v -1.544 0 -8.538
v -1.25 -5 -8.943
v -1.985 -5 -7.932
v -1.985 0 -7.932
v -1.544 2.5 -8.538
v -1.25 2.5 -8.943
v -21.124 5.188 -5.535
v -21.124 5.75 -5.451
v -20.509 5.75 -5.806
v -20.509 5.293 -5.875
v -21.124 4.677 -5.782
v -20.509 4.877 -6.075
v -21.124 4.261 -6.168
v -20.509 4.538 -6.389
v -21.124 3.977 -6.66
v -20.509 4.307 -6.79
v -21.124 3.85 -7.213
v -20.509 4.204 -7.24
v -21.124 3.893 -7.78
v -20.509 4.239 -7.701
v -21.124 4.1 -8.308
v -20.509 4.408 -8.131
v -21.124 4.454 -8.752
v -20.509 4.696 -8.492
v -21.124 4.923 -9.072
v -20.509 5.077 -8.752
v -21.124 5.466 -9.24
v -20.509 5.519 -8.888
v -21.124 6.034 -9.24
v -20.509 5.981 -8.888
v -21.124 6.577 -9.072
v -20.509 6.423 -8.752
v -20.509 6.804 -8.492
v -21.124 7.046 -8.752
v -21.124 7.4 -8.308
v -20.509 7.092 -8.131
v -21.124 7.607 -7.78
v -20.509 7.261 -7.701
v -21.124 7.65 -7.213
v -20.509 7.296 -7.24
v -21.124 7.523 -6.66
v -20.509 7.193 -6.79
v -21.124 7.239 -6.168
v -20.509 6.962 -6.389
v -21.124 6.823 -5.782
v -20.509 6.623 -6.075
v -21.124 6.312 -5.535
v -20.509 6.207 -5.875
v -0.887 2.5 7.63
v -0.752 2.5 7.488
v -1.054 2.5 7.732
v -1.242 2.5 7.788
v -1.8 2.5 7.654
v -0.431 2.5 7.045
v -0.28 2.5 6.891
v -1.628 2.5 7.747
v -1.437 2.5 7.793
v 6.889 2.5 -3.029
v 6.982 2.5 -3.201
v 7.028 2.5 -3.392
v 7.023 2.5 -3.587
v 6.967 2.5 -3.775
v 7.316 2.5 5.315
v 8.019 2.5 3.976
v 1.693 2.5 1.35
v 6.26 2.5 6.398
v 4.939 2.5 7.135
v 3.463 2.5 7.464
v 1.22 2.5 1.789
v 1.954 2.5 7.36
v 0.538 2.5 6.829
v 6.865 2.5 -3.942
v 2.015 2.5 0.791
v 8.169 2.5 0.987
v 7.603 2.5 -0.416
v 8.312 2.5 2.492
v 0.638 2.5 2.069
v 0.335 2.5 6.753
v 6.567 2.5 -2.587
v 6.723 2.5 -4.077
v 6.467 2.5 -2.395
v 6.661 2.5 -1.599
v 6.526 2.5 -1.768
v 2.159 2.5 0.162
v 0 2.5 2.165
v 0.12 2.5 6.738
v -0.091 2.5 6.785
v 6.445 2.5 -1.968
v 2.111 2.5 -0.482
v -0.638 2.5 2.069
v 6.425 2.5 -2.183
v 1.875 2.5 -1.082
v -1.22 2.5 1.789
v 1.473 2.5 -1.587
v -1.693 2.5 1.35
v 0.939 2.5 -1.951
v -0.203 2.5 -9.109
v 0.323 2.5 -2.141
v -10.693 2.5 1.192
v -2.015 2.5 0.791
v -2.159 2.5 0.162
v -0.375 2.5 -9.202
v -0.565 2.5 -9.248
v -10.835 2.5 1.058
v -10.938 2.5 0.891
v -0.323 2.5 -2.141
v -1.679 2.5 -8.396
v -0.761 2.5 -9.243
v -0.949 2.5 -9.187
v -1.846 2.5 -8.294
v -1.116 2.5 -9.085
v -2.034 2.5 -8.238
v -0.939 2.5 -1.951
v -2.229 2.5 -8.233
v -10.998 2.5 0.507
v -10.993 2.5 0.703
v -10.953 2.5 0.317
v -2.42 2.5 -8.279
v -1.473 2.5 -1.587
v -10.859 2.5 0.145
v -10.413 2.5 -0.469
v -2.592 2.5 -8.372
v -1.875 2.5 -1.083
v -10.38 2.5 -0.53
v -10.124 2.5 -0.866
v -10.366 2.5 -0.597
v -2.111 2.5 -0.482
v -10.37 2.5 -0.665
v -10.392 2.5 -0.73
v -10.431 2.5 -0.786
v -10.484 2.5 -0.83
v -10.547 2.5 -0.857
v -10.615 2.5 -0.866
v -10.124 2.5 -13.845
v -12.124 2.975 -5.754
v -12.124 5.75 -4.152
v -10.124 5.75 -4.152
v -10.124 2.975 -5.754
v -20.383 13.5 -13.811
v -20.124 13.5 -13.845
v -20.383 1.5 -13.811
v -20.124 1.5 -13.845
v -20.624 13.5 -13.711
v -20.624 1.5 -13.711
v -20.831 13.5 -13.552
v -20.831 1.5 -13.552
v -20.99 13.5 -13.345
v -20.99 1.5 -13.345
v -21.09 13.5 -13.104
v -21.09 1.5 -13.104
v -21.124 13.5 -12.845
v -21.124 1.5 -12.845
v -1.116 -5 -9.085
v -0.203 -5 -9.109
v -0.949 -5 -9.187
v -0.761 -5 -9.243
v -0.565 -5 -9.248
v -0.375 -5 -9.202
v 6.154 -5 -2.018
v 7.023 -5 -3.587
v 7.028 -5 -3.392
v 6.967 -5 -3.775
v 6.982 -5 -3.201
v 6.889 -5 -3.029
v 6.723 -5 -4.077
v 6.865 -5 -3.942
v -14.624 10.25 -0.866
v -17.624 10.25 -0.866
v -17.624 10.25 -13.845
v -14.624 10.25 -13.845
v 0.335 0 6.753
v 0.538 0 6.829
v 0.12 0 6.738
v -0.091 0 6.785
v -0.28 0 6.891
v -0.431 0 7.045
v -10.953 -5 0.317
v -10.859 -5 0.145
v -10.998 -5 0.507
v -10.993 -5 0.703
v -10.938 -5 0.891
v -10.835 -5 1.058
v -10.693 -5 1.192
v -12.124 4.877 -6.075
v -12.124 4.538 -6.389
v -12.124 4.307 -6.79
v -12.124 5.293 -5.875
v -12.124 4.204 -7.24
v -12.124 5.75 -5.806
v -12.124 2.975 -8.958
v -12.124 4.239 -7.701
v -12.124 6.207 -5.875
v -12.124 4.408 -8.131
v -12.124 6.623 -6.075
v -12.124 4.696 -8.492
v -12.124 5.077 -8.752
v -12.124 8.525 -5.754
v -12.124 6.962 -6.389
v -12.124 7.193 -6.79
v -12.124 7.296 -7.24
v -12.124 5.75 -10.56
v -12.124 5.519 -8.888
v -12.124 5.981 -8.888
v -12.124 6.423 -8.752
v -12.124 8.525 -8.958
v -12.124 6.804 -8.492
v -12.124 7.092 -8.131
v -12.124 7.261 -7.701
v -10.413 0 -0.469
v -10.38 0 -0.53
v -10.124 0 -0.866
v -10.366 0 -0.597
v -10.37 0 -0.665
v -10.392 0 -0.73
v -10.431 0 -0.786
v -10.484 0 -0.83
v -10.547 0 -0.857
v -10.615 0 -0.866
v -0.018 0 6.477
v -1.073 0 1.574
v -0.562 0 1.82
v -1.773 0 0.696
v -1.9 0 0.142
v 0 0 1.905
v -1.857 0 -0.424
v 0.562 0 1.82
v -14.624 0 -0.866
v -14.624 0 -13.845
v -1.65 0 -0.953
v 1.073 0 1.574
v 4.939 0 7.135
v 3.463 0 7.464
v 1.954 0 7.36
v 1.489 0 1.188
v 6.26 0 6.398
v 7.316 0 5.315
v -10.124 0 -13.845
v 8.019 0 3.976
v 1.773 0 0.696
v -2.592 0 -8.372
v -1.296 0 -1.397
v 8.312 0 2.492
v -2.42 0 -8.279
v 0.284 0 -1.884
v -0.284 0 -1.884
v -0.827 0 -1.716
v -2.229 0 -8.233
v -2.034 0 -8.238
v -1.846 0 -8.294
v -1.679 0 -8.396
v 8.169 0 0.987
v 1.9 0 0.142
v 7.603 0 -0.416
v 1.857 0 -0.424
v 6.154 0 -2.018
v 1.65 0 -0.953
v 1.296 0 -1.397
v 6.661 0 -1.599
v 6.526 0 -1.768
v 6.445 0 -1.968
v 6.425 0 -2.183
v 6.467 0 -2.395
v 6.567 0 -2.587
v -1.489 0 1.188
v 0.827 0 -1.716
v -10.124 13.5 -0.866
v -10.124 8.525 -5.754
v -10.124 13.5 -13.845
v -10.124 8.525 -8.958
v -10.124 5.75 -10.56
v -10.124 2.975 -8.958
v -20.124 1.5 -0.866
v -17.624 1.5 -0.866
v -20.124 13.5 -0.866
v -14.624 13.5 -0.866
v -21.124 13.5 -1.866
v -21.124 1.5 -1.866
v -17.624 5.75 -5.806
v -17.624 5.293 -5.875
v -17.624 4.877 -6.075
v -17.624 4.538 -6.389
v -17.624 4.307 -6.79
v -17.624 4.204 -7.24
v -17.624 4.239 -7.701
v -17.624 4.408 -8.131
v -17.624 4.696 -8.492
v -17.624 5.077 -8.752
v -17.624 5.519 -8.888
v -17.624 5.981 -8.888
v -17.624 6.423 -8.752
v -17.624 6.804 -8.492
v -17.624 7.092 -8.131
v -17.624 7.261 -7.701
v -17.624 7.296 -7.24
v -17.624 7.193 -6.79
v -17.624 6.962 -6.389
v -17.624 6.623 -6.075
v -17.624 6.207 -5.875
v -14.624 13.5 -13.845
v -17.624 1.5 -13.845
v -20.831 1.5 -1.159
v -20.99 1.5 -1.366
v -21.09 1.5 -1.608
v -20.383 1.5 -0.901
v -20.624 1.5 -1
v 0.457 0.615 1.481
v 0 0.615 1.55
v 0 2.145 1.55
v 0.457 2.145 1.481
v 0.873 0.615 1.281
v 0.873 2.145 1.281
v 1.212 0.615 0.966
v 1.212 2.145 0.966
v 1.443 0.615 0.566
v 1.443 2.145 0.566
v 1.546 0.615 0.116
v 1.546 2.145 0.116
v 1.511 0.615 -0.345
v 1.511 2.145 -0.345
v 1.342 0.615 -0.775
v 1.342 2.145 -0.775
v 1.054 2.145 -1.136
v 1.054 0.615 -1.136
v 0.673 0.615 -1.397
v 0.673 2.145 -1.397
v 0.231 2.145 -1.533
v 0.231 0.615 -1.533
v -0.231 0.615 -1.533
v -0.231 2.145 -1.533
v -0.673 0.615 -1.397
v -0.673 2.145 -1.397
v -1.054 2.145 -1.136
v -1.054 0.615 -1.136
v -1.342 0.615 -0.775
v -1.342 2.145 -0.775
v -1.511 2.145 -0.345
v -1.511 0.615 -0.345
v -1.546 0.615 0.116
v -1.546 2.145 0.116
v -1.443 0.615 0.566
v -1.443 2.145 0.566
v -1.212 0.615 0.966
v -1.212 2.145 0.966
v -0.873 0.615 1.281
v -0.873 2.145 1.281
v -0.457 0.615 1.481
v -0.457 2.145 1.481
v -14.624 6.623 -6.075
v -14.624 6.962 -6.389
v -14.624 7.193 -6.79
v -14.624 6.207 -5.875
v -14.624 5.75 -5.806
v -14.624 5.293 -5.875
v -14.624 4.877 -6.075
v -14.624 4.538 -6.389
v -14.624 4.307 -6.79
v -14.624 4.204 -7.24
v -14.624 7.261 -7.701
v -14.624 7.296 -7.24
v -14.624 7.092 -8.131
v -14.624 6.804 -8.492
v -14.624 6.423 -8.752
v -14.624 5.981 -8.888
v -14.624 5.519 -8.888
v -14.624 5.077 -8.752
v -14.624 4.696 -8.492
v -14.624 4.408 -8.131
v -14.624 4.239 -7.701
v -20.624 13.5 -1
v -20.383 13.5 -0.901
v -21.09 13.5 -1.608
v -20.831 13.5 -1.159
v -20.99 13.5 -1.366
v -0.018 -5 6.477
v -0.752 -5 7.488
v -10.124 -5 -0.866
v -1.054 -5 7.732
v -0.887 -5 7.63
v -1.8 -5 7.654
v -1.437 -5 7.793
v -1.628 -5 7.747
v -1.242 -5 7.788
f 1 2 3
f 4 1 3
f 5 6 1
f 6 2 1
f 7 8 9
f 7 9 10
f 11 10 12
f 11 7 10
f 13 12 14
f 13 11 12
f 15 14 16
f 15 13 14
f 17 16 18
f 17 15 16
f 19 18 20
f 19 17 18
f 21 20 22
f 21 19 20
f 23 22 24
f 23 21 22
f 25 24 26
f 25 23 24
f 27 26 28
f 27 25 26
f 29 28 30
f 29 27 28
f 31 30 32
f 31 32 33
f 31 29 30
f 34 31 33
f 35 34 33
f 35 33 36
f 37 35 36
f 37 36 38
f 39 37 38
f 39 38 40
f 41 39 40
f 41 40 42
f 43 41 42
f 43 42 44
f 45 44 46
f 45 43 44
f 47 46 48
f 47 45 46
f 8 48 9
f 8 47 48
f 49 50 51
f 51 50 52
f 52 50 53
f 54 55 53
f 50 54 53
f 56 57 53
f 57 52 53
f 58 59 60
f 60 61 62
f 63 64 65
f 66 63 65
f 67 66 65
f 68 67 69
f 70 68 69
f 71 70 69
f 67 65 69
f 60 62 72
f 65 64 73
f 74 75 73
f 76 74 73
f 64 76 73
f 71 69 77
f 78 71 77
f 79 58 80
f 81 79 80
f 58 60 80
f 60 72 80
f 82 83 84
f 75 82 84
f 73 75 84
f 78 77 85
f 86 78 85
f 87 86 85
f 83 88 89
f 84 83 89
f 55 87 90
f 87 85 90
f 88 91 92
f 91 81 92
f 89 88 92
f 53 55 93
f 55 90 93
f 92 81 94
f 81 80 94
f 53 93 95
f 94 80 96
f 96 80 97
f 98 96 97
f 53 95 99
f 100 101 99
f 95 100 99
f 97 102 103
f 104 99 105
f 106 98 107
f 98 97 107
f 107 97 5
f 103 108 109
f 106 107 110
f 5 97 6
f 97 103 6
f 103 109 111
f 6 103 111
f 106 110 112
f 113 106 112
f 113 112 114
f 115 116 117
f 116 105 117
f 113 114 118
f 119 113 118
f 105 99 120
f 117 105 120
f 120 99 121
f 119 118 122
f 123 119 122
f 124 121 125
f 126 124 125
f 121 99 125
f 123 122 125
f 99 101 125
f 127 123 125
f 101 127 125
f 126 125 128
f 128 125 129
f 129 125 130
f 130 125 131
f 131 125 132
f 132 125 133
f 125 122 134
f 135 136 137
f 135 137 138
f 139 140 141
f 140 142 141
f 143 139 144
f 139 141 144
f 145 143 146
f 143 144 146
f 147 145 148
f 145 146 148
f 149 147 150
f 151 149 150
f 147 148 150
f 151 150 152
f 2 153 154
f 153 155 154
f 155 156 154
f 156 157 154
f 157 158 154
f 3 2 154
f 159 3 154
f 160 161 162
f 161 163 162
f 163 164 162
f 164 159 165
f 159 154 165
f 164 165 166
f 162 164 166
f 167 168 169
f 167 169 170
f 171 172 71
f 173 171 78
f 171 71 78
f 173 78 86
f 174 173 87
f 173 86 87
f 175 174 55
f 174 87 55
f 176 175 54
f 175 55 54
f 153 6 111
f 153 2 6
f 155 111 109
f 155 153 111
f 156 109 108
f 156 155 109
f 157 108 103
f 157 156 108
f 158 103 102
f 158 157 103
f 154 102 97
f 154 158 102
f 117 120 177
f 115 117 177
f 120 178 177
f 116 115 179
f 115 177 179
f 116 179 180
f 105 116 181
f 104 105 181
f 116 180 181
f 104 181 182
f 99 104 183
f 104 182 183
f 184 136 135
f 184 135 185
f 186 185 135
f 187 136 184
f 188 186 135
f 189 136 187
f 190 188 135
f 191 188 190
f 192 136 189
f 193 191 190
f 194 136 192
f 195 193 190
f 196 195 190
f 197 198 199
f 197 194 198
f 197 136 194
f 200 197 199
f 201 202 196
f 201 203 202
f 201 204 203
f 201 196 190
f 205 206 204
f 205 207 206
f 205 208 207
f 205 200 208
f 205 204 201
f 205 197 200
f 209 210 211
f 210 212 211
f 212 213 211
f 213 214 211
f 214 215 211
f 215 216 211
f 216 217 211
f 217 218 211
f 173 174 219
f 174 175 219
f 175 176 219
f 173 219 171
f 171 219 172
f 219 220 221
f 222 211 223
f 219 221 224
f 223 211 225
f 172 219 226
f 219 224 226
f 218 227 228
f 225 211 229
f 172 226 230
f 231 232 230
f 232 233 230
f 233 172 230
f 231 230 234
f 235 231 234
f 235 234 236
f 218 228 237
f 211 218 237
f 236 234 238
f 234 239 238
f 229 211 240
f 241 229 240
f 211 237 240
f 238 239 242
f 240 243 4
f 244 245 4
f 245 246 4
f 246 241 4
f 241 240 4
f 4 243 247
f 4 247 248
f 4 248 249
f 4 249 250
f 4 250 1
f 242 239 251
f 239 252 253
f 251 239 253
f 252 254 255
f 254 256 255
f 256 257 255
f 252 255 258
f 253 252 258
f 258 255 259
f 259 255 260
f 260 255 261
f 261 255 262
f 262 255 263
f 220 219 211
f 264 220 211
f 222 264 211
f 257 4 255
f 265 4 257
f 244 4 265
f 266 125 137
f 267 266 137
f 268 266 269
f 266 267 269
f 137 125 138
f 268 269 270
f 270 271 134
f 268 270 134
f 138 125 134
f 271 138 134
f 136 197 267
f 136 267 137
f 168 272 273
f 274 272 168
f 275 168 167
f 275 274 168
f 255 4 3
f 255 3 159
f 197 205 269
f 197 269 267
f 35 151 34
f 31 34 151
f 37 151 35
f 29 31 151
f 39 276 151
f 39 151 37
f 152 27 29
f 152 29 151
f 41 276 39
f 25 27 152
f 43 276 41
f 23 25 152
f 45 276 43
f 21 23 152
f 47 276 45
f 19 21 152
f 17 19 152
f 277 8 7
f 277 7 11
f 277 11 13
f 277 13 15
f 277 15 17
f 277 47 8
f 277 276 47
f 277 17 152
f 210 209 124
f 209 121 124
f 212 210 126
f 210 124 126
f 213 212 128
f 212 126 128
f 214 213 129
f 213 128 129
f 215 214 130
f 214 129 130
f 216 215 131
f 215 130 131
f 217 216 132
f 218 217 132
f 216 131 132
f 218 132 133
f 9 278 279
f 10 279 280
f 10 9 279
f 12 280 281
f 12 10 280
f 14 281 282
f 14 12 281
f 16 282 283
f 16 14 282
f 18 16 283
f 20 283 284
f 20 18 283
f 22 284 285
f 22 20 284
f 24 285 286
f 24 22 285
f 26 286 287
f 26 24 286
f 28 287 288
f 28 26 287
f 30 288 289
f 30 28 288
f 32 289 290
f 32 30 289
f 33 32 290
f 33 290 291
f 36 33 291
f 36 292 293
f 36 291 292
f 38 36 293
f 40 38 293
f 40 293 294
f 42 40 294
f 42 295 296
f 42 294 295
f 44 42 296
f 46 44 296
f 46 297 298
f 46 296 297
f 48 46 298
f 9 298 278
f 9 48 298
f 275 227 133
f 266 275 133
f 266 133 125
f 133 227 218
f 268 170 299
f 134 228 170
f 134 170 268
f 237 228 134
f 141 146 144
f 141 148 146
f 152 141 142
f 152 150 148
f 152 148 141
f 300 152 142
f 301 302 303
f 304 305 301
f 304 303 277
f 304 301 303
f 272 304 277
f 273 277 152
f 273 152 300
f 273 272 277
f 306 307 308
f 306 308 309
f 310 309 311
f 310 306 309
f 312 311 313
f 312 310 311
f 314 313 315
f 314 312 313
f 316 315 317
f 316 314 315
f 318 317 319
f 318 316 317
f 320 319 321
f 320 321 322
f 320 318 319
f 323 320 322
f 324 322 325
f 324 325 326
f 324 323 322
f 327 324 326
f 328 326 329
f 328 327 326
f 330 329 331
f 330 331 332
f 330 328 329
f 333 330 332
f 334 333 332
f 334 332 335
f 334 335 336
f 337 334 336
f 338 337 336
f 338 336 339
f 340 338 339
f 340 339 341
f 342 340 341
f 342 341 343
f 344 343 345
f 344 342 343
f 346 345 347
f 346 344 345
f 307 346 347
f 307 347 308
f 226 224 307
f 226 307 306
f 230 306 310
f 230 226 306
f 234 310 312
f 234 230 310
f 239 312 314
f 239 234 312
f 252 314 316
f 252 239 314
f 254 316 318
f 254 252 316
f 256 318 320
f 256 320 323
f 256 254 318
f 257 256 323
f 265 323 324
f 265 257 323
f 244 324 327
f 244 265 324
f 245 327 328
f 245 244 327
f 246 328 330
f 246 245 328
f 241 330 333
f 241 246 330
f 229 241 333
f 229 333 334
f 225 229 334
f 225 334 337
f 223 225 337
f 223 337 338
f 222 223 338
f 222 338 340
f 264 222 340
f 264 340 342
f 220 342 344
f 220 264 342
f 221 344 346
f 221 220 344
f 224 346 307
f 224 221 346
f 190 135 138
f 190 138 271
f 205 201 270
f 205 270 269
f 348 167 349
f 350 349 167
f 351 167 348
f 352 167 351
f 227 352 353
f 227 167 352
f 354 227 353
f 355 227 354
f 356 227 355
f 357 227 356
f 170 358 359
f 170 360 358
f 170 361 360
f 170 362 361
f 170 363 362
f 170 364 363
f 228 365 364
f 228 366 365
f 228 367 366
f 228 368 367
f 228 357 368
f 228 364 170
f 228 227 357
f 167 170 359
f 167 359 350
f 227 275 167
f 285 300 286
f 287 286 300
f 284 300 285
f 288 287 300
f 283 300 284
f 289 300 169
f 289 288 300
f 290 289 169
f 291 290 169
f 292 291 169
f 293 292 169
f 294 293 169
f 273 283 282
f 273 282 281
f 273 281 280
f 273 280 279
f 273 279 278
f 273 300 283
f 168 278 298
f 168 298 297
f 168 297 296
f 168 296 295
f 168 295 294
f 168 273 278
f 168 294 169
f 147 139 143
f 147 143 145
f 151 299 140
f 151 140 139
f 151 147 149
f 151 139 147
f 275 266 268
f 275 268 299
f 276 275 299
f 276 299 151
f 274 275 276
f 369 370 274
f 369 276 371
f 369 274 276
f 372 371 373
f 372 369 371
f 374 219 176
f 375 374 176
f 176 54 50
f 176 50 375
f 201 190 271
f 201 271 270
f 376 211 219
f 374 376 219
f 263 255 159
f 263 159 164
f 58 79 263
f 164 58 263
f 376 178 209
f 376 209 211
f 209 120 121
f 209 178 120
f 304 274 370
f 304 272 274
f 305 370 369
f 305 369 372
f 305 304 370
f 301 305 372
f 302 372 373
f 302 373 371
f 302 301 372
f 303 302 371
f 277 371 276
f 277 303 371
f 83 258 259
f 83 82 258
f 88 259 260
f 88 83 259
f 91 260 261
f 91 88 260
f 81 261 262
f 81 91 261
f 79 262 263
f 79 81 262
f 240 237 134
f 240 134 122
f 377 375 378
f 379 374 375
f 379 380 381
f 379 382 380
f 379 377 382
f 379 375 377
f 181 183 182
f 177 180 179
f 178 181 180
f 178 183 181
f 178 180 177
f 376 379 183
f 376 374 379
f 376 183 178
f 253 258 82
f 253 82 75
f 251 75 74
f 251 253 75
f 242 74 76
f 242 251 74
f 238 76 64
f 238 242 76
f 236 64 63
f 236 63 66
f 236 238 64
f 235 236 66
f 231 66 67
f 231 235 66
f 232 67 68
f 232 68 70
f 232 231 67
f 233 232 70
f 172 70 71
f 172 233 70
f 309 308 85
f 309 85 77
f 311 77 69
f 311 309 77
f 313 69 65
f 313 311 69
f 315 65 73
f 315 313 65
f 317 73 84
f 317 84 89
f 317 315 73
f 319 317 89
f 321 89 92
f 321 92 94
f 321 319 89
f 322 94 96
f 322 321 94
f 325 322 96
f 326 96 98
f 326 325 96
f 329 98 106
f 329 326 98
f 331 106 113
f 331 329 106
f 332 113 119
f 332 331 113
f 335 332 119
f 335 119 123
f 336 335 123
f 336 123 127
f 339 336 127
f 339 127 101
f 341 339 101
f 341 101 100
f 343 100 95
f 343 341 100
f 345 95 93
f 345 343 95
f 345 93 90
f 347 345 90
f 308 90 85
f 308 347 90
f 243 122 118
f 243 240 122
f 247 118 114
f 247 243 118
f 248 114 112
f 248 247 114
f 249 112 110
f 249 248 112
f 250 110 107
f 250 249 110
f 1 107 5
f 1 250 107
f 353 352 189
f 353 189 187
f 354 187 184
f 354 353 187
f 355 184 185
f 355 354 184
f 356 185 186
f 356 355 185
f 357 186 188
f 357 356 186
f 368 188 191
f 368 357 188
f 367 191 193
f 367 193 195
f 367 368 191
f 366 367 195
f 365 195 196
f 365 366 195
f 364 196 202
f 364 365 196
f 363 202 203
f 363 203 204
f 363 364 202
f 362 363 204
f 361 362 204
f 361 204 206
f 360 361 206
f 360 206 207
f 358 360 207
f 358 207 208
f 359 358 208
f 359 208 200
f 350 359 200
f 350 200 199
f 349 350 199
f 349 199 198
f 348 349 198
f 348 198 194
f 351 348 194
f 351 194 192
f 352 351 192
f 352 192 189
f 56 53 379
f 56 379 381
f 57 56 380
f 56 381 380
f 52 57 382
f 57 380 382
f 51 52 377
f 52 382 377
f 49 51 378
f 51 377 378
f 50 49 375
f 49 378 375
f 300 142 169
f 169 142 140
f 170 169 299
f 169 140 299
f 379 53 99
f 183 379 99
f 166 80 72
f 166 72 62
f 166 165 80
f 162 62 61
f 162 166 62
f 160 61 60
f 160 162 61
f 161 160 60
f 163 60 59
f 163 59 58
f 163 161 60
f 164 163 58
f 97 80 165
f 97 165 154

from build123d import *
from OCP.BRepFilletAPI import BRepFilletAPI_MakeChamfer

# Parameters (mm, degrees)
SKETCH_1_R             = 1.55
EXTRUDE_512_DEPTH      = 2.5
EXTRUDE_START          = 2.5
EXTRUDE_979_DEPTH      = 7.5
SKETCH_3_W             = 4.5
SKETCH_3_H             = 12.978713764
EXTRUDE_1_DEPTH        = 13.5
EXTRUDE_START_2        = -0.866441
EXTRUDE_2_DEPTH        = 12.978713764
SKETCH_5_R             = 1.55
CUT_EXTRUDE_1800_DEPTH = 36.225185951
CUT_EXTRUDE_START      = 9
SKETCH_5_3_R           = 1.55
CUT_EXTRUDE_1842_DEPTH = 2
CHAMFER_1_SIZE         = 0.615
CHAMFER_1_SIZE2        = 0.355070416
FILLET_5_R             = 0.75
FILLET_6_R             = 0.25
FILLET_8_R             = 1


with BuildPart() as part:
    # 草图1 → Extrude 512 (new body)
    with BuildSketch(Plane(origin=(0, 0, 0), x_dir=(1, 0, 0), z_dir=(0, 1, 0))):
        with BuildLine():
            Line((-10.1243866, 13.845154317), (6.15423406, 2.01804411))
            ThreePointArc((6.15423406, 2.01804411), (7.315700706, -5.315167685), (-0.017511089, -6.476634331))
            Line((-0.017511089, -6.476634331), (-10.1243866, 0.866440553))
            Line((-10.1243866, 0.866440553), (-10.1243866, 13.845154317))
        make_face()
        with Locations(Location((0, 0, 0), (0, 0, 270))):
            Circle(SKETCH_1_R, mode=Mode.SUBTRACT)
    extrude(amount=EXTRUDE_512_DEPTH)

    # 草图2 → Extrude 979 (add)
    with BuildSketch(Plane(origin=(0, 0, 0), x_dir=(1, 0, 0), z_dir=(0, 1, 0)).offset(EXTRUDE_START)):
        Polygon((-10.1243866, 0.866440553), (-0.017511089, -6.476634331), (-1.193081594, -8.09466832), (-11.299957105, -0.751593436), align=None)
        Polygon((7.329804565, 3.636078099), (-0.809505765, 9.549633202), (-1.98507627, 7.931599213), (6.15423406, 2.01804411), align=None)
    extrude(amount=-EXTRUDE_979_DEPTH)

    # 草图3 → 限位-1 (add)
    with BuildSketch(Plane(origin=(0, 0, 0), x_dir=(1, 0, 0), z_dir=(0, 1, 0))):
        with Locations((-12.3743866, 7.355797435)):
            Rectangle(SKETCH_3_W, SKETCH_3_H)
    extrude(amount=EXTRUDE_1_DEPTH)

    # 草图4 → 限位-2 (add)
    with BuildSketch(Plane.XY.offset(EXTRUDE_START_2)):
        Polygon((-14.6243866, 10.25), (-14.6243866, 13.5), (-21.1243866, 13.5), (-21.1243866, 1.5), (-17.6243866, 1.5), (-17.6243866, 10.25), align=None)
    extrude(amount=-EXTRUDE_2_DEPTH)

    # 草图5 → Cut-Extrude 1800 (cut, through all)
    with BuildSketch(Plane(origin=(-21.1243866, 0, 0), x_dir=(0, 0, -1), z_dir=(1, 0, 0))):
        with Locations(Location((7.355797435, 5.75, 0), (0, 0, 180))):
            Circle(SKETCH_5_R)
    extrude(amount=CUT_EXTRUDE_1800_DEPTH, mode=Mode.SUBTRACT)

    # 草图5<3> → Cut-Extrude 1842 (cut)
    with BuildSketch(Plane(origin=(-21.1243866, 0, 0), x_dir=(0, 0, -1), z_dir=(1, 0, 0)).offset(CUT_EXTRUDE_START)):
        Polygon((5.753650438, 2.975), (8.957944432, 2.975), (10.560091429, 5.75), (8.957944432, 8.525), (5.753650438, 8.525), (4.151503441, 5.75), align=None)
        with Locations(Location((7.355797435, 5.75, 0), (0, 0, 180))):
            Circle(SKETCH_5_3_R, mode=Mode.SUBTRACT)
    extrude(amount=CUT_EXTRUDE_1842_DEPTH, mode=Mode.SUBTRACT)

    # 倒角1: one chamfer whose edges measure the first distance from different faces: ONE call of the kernel's chamfer builder (chamfer() names one face for all edges)
    chamfer_1_edges_1 = [part.edges().sort_by_distance(p)[0] for p in [
        (0, 0, -1.55),
    ]]
    chamfer_1_side_1 = [part.faces().sort_by_distance(p)[0] for p in [
        (0, 1.25, -1.55),
    ]]
    chamfer_1_edges_2 = [part.edges().sort_by_distance(p)[0] for p in [
        (0, 2.5, -1.55),
    ]]
    chamfer_1_side_2 = [part.faces().sort_by_distance(p)[0] for p in [
        (-1.825655455, 2.5, -1.521026415),
    ]]
    chamfer_1_edges_3 = [part.edges().sort_by_distance(p)[0] for p in [
        (-21.1243866, 5.75, -8.905797435),
    ]]
    chamfer_1_side_3 = [part.faces().sort_by_distance(p)[0] for p in [
        (-19.3743866, 5.75, -8.905797435),
    ]]
    chamfer_1 = BRepFilletAPI_MakeChamfer(part.part.solid().wrapped)
    for e in chamfer_1_edges_1:
        chamfer_1.Add(CHAMFER_1_SIZE, CHAMFER_1_SIZE2, e.wrapped, chamfer_1_side_1[0].wrapped)  # the first distance lies on this face
    for e in chamfer_1_edges_2:
        chamfer_1.Add(CHAMFER_1_SIZE, CHAMFER_1_SIZE2, e.wrapped, chamfer_1_side_2[0].wrapped)  # the first distance lies on this face
    for e in chamfer_1_edges_3:
        chamfer_1.Add(CHAMFER_1_SIZE, CHAMFER_1_SIZE2, e.wrapped, chamfer_1_side_3[0].wrapped)  # the first distance lies on this face
    add(Compound.cast(chamfer_1.Shape()), mode=Mode.REPLACE)

    # 圆角5
    fillet_5_edges = [part.edges().sort_by_distance(p)[0] for p in [
        (-1.193081594, -1.25, 8.09466832),
        (-11.299957105, -1.25, 0.751593436),
        (-1.98507627, 1.25, -7.931599213),
        (-0.809505765, -1.25, -9.549633202),
        (7.329804565, -1.25, -3.636078099),
        (-0.017511089, 1.25, 6.476634331),
        (6.15423406, 1.25, -2.01804411),
    ]]
    fillet(fillet_5_edges, radius=FILLET_5_R)

    # 圆角6
    fillet_6_edges = [part.edges().sort_by_distance(p)[0] for p in [
        (-10.1243866, 1.25, -0.866440553),
    ]]
    fillet(fillet_6_edges, radius=FILLET_6_R)

    # 圆角8
    fillet_8_edges = [part.edges().sort_by_distance(p)[0] for p in [
        (-21.1243866, 7.5, -13.845154764),
        (-21.1243866, 7.5, -0.866441),
    ]]
    fillet(fillet_8_edges, radius=FILLET_8_R)


solid = part.part
